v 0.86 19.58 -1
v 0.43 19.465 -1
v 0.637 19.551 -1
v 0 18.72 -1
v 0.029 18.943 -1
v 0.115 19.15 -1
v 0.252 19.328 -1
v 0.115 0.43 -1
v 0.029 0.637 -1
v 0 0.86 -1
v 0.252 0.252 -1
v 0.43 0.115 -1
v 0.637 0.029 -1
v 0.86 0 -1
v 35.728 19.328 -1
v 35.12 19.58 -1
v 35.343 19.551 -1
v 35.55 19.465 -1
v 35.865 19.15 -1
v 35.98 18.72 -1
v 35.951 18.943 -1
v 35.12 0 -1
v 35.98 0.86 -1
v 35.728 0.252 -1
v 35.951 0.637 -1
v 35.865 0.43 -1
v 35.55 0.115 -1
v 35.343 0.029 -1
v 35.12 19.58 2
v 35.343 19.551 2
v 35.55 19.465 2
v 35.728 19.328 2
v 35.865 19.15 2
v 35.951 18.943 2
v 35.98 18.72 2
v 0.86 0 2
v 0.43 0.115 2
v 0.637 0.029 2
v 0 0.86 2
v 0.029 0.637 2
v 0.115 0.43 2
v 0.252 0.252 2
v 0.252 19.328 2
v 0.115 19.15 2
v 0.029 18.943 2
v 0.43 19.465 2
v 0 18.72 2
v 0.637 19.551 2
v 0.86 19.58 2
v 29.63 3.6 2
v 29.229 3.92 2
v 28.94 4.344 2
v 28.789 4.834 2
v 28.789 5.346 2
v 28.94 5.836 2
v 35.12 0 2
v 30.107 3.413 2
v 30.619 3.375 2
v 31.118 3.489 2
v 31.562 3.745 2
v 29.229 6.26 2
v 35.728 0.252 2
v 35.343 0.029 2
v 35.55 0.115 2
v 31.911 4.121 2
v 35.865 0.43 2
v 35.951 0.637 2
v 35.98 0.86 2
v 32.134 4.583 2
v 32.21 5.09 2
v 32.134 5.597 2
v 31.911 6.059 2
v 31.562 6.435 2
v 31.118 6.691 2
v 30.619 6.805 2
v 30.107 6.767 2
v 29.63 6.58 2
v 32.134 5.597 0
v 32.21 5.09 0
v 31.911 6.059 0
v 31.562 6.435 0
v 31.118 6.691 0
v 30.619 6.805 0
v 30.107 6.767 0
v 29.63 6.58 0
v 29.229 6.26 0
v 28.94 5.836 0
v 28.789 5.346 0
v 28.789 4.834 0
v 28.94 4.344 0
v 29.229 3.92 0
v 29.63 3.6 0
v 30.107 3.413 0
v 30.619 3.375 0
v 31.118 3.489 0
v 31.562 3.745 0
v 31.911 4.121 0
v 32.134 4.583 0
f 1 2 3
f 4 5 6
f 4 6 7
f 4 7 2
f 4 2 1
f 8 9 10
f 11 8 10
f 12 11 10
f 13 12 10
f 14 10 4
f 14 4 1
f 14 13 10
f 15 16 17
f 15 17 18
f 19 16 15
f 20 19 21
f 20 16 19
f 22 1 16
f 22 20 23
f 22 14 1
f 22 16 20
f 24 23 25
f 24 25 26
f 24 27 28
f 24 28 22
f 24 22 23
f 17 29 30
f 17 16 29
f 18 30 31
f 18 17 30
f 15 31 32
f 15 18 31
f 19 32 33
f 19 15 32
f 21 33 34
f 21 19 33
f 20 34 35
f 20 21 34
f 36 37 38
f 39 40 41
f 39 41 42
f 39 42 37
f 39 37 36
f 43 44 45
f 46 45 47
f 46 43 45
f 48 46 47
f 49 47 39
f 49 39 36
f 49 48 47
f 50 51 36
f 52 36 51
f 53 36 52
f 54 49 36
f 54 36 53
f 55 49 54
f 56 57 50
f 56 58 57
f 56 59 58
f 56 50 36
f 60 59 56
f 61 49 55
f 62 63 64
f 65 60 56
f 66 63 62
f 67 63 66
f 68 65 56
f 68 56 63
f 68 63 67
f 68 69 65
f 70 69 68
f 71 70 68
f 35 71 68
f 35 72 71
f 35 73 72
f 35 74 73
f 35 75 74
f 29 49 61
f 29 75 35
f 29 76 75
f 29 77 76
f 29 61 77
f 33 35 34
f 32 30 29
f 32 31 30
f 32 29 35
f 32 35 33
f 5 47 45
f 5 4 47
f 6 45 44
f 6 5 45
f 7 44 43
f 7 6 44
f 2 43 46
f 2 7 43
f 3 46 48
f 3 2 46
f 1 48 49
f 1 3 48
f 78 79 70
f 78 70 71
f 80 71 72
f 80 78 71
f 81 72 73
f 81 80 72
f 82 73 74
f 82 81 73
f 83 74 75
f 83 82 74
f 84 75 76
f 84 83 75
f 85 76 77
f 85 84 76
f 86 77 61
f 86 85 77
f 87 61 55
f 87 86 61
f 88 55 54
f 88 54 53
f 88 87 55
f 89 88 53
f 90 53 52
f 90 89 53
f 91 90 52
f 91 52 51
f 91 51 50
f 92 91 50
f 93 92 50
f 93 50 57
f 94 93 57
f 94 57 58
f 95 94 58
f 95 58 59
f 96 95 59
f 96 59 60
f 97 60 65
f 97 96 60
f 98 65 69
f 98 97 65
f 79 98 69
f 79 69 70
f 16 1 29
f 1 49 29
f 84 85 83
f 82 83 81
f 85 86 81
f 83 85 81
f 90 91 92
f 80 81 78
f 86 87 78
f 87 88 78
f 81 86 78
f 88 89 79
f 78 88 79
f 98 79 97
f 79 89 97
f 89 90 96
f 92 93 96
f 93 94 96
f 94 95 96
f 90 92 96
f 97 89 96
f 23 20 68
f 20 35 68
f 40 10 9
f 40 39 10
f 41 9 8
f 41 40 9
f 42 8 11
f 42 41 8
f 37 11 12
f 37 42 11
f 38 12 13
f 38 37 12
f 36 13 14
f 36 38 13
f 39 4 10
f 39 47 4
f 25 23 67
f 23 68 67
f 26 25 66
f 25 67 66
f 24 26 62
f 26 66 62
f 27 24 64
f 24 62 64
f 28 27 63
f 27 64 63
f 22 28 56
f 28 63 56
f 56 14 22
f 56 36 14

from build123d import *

# Parameters (mm, degrees)
SKETCH_W     = 35.98
SKETCH_H     = 19.58
SKETCH_R     = 1.72
PAD_DEPTH    = 2
SKETCH001_W  = 35.98
SKETCH001_H  = 19.58
PAD001_DEPTH = 1
FILLET_R     = 0.86


with BuildPart() as part:
    # Sketch → Pad (new body)
    with BuildSketch(Plane.XY):
        with Locations((17.99, 9.79)):
            Rectangle(SKETCH_W, SKETCH_H)
        with Locations((30.49, 5.09)):
            Circle(SKETCH_R, mode=Mode.SUBTRACT)
    extrude(amount=PAD_DEPTH)

    # Sketch001 (on Face6 of Pad) → Pad001 (join)
    with BuildSketch(Plane(origin=(0, 0, 0), x_dir=(1, 0, 0), z_dir=(0, 0, -1))):
        with Locations((17.99, -9.79)):
            Rectangle(SKETCH001_W, SKETCH001_H)
    extrude(amount=PAD001_DEPTH)

    # Fillet
    fillet_edges = [part.edges().sort_by_distance(p)[0] for p in [
        (0, 0, 0.5),
        (0, 19.58, 0.5),
        (35.98, 19.58, 0.5),
        (35.98, 0, 0.5),
    ]]
    fillet(fillet_edges, radius=FILLET_R)


solid = part.part
